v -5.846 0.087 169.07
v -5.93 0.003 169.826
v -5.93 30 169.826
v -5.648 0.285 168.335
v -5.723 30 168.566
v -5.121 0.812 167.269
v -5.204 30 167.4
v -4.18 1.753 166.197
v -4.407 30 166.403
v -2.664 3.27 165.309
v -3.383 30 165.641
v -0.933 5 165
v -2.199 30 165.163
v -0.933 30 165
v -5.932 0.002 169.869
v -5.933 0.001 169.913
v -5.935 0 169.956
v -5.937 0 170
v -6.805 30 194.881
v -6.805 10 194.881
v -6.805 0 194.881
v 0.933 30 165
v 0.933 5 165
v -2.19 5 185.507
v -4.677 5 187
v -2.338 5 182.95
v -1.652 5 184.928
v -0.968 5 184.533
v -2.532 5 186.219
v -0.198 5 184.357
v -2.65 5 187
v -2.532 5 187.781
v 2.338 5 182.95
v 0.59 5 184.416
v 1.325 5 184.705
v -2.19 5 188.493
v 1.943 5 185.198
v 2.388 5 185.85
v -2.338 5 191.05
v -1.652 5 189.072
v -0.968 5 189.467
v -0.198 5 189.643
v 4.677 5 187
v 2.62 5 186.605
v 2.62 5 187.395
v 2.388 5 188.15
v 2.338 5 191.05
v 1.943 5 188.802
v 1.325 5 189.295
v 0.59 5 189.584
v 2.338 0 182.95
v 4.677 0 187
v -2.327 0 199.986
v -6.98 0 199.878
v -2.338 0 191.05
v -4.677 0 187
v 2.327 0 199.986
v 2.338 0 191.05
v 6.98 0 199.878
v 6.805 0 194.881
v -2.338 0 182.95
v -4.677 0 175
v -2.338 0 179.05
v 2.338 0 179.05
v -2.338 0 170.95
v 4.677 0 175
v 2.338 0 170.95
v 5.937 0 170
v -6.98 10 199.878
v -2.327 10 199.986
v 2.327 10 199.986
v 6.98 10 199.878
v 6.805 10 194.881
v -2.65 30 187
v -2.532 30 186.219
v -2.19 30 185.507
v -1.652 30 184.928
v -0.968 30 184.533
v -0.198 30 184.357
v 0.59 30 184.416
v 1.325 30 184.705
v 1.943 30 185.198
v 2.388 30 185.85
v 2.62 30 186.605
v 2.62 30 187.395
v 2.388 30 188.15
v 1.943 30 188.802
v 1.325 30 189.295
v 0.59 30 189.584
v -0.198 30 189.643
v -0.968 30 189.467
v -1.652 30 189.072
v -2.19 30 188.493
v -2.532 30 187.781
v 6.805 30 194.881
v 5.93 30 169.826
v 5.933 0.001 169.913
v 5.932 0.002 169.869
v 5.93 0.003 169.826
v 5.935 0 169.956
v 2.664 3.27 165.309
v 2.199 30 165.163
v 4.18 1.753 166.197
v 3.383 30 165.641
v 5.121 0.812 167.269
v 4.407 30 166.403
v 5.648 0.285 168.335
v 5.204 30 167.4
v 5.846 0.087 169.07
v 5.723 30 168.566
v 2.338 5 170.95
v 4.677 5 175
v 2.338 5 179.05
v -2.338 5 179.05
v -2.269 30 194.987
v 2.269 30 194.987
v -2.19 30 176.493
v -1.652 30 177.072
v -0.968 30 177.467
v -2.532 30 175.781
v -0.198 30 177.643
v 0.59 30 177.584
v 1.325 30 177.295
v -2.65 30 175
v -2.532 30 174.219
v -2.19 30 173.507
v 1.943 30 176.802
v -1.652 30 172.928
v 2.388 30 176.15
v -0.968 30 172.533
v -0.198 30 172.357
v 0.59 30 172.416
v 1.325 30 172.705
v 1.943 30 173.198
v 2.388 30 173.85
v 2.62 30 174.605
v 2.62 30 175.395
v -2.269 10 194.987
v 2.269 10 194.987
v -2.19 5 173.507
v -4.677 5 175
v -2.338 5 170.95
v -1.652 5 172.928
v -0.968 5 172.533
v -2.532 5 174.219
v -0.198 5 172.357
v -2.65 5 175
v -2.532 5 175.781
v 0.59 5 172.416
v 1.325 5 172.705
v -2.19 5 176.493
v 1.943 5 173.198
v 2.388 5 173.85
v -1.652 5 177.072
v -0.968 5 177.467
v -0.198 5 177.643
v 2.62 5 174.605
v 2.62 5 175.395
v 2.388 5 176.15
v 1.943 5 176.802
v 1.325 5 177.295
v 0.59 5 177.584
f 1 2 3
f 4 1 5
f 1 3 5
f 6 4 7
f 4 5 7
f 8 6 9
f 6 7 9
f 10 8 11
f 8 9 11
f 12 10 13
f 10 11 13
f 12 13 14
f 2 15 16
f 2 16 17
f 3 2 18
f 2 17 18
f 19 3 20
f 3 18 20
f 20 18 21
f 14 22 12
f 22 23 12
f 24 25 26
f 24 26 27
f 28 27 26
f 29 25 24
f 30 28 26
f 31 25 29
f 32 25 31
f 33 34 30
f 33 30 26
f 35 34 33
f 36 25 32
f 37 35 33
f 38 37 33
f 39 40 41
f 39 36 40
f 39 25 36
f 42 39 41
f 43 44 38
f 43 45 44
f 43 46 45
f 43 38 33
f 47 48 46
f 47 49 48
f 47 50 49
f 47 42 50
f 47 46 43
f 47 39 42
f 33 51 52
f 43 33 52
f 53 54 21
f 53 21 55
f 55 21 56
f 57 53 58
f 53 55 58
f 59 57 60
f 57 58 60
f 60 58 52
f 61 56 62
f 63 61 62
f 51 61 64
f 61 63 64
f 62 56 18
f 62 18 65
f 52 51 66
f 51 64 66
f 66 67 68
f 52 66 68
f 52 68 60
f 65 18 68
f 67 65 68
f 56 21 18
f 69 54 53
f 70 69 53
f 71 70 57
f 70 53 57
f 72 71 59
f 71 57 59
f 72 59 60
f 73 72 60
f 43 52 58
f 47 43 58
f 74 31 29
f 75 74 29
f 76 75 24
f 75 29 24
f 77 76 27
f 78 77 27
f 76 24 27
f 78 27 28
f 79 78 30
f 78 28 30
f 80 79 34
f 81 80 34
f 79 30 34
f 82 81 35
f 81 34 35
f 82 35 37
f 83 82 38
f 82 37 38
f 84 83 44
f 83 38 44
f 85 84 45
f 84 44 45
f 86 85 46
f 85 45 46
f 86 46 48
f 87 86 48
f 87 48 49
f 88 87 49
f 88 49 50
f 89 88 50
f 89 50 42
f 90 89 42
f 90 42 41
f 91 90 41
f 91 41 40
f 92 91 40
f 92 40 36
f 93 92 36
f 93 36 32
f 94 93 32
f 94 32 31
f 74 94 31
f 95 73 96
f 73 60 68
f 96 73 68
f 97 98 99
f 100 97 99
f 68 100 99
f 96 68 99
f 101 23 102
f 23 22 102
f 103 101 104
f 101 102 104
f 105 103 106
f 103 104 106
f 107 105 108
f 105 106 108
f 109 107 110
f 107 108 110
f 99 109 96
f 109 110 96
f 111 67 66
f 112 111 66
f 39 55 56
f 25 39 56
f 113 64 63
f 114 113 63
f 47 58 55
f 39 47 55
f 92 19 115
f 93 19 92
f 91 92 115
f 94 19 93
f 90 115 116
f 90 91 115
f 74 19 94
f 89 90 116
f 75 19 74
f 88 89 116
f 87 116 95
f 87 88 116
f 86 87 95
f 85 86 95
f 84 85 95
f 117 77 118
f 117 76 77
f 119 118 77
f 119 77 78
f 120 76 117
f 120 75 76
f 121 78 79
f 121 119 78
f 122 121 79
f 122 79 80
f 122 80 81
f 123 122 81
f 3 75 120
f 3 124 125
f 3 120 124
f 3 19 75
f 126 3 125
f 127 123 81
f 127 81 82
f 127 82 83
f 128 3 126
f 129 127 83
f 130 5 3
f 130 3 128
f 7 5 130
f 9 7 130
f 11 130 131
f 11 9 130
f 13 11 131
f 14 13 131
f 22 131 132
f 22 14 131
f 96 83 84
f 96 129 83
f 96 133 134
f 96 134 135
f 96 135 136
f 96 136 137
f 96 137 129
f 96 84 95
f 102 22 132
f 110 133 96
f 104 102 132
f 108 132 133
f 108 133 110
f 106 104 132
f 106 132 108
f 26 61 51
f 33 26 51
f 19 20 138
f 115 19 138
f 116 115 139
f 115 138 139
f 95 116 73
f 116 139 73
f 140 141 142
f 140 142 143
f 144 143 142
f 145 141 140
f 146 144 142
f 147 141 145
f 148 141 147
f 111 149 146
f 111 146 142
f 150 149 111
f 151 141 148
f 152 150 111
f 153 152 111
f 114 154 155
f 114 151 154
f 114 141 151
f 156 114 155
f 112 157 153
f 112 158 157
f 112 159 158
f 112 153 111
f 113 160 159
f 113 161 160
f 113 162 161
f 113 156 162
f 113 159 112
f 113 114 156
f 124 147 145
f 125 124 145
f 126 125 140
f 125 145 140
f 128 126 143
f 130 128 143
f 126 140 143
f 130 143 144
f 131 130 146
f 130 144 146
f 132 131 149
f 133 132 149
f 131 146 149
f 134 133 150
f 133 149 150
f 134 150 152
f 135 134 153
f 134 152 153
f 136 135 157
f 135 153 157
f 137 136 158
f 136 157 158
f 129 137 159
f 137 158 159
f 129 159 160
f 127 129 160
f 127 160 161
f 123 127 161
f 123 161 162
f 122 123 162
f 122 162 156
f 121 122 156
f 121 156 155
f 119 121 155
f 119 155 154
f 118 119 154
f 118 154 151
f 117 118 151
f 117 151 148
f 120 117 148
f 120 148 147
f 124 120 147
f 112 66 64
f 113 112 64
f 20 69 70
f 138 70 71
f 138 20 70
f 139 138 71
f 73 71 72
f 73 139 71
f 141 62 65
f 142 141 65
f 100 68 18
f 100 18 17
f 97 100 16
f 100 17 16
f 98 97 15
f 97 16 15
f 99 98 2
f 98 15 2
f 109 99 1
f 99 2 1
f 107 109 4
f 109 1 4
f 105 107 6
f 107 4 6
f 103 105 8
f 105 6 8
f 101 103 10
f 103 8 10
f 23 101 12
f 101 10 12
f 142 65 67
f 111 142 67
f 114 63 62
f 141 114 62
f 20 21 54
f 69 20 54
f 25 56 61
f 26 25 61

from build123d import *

# Parameters (mm, degrees)
EXTRUDE_583_DEPTH   = 30
EXTRUDE_631_DEPTH   = 10
FILLET_1_R          = 5
HOLE_WIZARD_M5_1_D  = 5.3
CUT_EXTRUDE_1_DEPTH = 5


with BuildPart() as part:
    # 草图1 → Extrude 583 (new body)
    with BuildSketch(Plane(origin=(0, 0, 0), x_dir=(1, 0, 0), z_dir=(0, 1, 0))):
        with BuildLine():
            Line((5.761926966, -165), (-5.761926966, -165))
            Line((-5.761926966, -165), (-6.805401857, -194.881211269))
            ThreePointArc((-6.805401857, -194.881211269), (0, -195), (6.805401857, -194.881211269))
            Line((6.805401857, -194.881211269), (5.761926966, -165))
        make_face()
    extrude(amount=EXTRUDE_583_DEPTH)

    # 草图1<3> → Extrude 631 (add)
    with BuildSketch(Plane(origin=(0, 0, 0), x_dir=(1, 0, 0), z_dir=(0, 1, 0))):
        with BuildLine():
            ThreePointArc((6.805401857, -194.881211269), (0, -195), (-6.805401857, -194.881211269))
            Line((-6.805401857, -194.881211269), (-6.979899341, -199.878165404))
            ThreePointArc((-6.979899341, -199.878165404), (0, -200), (6.979899341, -199.878165404))
            Line((6.979899341, -199.878165404), (6.805401857, -194.881211269))
        make_face()
    extrude(amount=EXTRUDE_631_DEPTH)

    # 圆角1
    fillet_1_edges = [part.edges().sort_by_distance(p)[0] for p in [
        (0, 0, 165),
        (-5.761926966, 15, 165),
        (5.761926966, 15, 165),
    ]]
    fillet(fillet_1_edges, radius=FILLET_1_R)

    # M5 间隙孔1 (through all)
    with Locations(Plane(origin=(0, 30, 0), x_dir=(1, 0, 0), z_dir=(0, 1, 0))):
        with Locations((0, -187), (0, -175)):
            Hole(HOLE_WIZARD_M5_1_D / 2)

    # 草图6 → 切除-拉伸1 (cut)
    with BuildSketch(Plane.XZ):
        Polygon((-4.67653718, 175), (-2.33826859, 170.95), (2.33826859, 170.95), (4.67653718, 175), (2.33826859, 179.05), (-2.33826859, 179.05), align=None)
        Polygon((-4.67653718, 187), (-2.33826859, 182.95), (2.33826859, 182.95), (4.67653718, 187), (2.33826859, 191.05), (-2.33826859, 191.05), align=None)
    extrude(amount=-CUT_EXTRUDE_1_DEPTH, mode=Mode.SUBTRACT)


solid = part.part
